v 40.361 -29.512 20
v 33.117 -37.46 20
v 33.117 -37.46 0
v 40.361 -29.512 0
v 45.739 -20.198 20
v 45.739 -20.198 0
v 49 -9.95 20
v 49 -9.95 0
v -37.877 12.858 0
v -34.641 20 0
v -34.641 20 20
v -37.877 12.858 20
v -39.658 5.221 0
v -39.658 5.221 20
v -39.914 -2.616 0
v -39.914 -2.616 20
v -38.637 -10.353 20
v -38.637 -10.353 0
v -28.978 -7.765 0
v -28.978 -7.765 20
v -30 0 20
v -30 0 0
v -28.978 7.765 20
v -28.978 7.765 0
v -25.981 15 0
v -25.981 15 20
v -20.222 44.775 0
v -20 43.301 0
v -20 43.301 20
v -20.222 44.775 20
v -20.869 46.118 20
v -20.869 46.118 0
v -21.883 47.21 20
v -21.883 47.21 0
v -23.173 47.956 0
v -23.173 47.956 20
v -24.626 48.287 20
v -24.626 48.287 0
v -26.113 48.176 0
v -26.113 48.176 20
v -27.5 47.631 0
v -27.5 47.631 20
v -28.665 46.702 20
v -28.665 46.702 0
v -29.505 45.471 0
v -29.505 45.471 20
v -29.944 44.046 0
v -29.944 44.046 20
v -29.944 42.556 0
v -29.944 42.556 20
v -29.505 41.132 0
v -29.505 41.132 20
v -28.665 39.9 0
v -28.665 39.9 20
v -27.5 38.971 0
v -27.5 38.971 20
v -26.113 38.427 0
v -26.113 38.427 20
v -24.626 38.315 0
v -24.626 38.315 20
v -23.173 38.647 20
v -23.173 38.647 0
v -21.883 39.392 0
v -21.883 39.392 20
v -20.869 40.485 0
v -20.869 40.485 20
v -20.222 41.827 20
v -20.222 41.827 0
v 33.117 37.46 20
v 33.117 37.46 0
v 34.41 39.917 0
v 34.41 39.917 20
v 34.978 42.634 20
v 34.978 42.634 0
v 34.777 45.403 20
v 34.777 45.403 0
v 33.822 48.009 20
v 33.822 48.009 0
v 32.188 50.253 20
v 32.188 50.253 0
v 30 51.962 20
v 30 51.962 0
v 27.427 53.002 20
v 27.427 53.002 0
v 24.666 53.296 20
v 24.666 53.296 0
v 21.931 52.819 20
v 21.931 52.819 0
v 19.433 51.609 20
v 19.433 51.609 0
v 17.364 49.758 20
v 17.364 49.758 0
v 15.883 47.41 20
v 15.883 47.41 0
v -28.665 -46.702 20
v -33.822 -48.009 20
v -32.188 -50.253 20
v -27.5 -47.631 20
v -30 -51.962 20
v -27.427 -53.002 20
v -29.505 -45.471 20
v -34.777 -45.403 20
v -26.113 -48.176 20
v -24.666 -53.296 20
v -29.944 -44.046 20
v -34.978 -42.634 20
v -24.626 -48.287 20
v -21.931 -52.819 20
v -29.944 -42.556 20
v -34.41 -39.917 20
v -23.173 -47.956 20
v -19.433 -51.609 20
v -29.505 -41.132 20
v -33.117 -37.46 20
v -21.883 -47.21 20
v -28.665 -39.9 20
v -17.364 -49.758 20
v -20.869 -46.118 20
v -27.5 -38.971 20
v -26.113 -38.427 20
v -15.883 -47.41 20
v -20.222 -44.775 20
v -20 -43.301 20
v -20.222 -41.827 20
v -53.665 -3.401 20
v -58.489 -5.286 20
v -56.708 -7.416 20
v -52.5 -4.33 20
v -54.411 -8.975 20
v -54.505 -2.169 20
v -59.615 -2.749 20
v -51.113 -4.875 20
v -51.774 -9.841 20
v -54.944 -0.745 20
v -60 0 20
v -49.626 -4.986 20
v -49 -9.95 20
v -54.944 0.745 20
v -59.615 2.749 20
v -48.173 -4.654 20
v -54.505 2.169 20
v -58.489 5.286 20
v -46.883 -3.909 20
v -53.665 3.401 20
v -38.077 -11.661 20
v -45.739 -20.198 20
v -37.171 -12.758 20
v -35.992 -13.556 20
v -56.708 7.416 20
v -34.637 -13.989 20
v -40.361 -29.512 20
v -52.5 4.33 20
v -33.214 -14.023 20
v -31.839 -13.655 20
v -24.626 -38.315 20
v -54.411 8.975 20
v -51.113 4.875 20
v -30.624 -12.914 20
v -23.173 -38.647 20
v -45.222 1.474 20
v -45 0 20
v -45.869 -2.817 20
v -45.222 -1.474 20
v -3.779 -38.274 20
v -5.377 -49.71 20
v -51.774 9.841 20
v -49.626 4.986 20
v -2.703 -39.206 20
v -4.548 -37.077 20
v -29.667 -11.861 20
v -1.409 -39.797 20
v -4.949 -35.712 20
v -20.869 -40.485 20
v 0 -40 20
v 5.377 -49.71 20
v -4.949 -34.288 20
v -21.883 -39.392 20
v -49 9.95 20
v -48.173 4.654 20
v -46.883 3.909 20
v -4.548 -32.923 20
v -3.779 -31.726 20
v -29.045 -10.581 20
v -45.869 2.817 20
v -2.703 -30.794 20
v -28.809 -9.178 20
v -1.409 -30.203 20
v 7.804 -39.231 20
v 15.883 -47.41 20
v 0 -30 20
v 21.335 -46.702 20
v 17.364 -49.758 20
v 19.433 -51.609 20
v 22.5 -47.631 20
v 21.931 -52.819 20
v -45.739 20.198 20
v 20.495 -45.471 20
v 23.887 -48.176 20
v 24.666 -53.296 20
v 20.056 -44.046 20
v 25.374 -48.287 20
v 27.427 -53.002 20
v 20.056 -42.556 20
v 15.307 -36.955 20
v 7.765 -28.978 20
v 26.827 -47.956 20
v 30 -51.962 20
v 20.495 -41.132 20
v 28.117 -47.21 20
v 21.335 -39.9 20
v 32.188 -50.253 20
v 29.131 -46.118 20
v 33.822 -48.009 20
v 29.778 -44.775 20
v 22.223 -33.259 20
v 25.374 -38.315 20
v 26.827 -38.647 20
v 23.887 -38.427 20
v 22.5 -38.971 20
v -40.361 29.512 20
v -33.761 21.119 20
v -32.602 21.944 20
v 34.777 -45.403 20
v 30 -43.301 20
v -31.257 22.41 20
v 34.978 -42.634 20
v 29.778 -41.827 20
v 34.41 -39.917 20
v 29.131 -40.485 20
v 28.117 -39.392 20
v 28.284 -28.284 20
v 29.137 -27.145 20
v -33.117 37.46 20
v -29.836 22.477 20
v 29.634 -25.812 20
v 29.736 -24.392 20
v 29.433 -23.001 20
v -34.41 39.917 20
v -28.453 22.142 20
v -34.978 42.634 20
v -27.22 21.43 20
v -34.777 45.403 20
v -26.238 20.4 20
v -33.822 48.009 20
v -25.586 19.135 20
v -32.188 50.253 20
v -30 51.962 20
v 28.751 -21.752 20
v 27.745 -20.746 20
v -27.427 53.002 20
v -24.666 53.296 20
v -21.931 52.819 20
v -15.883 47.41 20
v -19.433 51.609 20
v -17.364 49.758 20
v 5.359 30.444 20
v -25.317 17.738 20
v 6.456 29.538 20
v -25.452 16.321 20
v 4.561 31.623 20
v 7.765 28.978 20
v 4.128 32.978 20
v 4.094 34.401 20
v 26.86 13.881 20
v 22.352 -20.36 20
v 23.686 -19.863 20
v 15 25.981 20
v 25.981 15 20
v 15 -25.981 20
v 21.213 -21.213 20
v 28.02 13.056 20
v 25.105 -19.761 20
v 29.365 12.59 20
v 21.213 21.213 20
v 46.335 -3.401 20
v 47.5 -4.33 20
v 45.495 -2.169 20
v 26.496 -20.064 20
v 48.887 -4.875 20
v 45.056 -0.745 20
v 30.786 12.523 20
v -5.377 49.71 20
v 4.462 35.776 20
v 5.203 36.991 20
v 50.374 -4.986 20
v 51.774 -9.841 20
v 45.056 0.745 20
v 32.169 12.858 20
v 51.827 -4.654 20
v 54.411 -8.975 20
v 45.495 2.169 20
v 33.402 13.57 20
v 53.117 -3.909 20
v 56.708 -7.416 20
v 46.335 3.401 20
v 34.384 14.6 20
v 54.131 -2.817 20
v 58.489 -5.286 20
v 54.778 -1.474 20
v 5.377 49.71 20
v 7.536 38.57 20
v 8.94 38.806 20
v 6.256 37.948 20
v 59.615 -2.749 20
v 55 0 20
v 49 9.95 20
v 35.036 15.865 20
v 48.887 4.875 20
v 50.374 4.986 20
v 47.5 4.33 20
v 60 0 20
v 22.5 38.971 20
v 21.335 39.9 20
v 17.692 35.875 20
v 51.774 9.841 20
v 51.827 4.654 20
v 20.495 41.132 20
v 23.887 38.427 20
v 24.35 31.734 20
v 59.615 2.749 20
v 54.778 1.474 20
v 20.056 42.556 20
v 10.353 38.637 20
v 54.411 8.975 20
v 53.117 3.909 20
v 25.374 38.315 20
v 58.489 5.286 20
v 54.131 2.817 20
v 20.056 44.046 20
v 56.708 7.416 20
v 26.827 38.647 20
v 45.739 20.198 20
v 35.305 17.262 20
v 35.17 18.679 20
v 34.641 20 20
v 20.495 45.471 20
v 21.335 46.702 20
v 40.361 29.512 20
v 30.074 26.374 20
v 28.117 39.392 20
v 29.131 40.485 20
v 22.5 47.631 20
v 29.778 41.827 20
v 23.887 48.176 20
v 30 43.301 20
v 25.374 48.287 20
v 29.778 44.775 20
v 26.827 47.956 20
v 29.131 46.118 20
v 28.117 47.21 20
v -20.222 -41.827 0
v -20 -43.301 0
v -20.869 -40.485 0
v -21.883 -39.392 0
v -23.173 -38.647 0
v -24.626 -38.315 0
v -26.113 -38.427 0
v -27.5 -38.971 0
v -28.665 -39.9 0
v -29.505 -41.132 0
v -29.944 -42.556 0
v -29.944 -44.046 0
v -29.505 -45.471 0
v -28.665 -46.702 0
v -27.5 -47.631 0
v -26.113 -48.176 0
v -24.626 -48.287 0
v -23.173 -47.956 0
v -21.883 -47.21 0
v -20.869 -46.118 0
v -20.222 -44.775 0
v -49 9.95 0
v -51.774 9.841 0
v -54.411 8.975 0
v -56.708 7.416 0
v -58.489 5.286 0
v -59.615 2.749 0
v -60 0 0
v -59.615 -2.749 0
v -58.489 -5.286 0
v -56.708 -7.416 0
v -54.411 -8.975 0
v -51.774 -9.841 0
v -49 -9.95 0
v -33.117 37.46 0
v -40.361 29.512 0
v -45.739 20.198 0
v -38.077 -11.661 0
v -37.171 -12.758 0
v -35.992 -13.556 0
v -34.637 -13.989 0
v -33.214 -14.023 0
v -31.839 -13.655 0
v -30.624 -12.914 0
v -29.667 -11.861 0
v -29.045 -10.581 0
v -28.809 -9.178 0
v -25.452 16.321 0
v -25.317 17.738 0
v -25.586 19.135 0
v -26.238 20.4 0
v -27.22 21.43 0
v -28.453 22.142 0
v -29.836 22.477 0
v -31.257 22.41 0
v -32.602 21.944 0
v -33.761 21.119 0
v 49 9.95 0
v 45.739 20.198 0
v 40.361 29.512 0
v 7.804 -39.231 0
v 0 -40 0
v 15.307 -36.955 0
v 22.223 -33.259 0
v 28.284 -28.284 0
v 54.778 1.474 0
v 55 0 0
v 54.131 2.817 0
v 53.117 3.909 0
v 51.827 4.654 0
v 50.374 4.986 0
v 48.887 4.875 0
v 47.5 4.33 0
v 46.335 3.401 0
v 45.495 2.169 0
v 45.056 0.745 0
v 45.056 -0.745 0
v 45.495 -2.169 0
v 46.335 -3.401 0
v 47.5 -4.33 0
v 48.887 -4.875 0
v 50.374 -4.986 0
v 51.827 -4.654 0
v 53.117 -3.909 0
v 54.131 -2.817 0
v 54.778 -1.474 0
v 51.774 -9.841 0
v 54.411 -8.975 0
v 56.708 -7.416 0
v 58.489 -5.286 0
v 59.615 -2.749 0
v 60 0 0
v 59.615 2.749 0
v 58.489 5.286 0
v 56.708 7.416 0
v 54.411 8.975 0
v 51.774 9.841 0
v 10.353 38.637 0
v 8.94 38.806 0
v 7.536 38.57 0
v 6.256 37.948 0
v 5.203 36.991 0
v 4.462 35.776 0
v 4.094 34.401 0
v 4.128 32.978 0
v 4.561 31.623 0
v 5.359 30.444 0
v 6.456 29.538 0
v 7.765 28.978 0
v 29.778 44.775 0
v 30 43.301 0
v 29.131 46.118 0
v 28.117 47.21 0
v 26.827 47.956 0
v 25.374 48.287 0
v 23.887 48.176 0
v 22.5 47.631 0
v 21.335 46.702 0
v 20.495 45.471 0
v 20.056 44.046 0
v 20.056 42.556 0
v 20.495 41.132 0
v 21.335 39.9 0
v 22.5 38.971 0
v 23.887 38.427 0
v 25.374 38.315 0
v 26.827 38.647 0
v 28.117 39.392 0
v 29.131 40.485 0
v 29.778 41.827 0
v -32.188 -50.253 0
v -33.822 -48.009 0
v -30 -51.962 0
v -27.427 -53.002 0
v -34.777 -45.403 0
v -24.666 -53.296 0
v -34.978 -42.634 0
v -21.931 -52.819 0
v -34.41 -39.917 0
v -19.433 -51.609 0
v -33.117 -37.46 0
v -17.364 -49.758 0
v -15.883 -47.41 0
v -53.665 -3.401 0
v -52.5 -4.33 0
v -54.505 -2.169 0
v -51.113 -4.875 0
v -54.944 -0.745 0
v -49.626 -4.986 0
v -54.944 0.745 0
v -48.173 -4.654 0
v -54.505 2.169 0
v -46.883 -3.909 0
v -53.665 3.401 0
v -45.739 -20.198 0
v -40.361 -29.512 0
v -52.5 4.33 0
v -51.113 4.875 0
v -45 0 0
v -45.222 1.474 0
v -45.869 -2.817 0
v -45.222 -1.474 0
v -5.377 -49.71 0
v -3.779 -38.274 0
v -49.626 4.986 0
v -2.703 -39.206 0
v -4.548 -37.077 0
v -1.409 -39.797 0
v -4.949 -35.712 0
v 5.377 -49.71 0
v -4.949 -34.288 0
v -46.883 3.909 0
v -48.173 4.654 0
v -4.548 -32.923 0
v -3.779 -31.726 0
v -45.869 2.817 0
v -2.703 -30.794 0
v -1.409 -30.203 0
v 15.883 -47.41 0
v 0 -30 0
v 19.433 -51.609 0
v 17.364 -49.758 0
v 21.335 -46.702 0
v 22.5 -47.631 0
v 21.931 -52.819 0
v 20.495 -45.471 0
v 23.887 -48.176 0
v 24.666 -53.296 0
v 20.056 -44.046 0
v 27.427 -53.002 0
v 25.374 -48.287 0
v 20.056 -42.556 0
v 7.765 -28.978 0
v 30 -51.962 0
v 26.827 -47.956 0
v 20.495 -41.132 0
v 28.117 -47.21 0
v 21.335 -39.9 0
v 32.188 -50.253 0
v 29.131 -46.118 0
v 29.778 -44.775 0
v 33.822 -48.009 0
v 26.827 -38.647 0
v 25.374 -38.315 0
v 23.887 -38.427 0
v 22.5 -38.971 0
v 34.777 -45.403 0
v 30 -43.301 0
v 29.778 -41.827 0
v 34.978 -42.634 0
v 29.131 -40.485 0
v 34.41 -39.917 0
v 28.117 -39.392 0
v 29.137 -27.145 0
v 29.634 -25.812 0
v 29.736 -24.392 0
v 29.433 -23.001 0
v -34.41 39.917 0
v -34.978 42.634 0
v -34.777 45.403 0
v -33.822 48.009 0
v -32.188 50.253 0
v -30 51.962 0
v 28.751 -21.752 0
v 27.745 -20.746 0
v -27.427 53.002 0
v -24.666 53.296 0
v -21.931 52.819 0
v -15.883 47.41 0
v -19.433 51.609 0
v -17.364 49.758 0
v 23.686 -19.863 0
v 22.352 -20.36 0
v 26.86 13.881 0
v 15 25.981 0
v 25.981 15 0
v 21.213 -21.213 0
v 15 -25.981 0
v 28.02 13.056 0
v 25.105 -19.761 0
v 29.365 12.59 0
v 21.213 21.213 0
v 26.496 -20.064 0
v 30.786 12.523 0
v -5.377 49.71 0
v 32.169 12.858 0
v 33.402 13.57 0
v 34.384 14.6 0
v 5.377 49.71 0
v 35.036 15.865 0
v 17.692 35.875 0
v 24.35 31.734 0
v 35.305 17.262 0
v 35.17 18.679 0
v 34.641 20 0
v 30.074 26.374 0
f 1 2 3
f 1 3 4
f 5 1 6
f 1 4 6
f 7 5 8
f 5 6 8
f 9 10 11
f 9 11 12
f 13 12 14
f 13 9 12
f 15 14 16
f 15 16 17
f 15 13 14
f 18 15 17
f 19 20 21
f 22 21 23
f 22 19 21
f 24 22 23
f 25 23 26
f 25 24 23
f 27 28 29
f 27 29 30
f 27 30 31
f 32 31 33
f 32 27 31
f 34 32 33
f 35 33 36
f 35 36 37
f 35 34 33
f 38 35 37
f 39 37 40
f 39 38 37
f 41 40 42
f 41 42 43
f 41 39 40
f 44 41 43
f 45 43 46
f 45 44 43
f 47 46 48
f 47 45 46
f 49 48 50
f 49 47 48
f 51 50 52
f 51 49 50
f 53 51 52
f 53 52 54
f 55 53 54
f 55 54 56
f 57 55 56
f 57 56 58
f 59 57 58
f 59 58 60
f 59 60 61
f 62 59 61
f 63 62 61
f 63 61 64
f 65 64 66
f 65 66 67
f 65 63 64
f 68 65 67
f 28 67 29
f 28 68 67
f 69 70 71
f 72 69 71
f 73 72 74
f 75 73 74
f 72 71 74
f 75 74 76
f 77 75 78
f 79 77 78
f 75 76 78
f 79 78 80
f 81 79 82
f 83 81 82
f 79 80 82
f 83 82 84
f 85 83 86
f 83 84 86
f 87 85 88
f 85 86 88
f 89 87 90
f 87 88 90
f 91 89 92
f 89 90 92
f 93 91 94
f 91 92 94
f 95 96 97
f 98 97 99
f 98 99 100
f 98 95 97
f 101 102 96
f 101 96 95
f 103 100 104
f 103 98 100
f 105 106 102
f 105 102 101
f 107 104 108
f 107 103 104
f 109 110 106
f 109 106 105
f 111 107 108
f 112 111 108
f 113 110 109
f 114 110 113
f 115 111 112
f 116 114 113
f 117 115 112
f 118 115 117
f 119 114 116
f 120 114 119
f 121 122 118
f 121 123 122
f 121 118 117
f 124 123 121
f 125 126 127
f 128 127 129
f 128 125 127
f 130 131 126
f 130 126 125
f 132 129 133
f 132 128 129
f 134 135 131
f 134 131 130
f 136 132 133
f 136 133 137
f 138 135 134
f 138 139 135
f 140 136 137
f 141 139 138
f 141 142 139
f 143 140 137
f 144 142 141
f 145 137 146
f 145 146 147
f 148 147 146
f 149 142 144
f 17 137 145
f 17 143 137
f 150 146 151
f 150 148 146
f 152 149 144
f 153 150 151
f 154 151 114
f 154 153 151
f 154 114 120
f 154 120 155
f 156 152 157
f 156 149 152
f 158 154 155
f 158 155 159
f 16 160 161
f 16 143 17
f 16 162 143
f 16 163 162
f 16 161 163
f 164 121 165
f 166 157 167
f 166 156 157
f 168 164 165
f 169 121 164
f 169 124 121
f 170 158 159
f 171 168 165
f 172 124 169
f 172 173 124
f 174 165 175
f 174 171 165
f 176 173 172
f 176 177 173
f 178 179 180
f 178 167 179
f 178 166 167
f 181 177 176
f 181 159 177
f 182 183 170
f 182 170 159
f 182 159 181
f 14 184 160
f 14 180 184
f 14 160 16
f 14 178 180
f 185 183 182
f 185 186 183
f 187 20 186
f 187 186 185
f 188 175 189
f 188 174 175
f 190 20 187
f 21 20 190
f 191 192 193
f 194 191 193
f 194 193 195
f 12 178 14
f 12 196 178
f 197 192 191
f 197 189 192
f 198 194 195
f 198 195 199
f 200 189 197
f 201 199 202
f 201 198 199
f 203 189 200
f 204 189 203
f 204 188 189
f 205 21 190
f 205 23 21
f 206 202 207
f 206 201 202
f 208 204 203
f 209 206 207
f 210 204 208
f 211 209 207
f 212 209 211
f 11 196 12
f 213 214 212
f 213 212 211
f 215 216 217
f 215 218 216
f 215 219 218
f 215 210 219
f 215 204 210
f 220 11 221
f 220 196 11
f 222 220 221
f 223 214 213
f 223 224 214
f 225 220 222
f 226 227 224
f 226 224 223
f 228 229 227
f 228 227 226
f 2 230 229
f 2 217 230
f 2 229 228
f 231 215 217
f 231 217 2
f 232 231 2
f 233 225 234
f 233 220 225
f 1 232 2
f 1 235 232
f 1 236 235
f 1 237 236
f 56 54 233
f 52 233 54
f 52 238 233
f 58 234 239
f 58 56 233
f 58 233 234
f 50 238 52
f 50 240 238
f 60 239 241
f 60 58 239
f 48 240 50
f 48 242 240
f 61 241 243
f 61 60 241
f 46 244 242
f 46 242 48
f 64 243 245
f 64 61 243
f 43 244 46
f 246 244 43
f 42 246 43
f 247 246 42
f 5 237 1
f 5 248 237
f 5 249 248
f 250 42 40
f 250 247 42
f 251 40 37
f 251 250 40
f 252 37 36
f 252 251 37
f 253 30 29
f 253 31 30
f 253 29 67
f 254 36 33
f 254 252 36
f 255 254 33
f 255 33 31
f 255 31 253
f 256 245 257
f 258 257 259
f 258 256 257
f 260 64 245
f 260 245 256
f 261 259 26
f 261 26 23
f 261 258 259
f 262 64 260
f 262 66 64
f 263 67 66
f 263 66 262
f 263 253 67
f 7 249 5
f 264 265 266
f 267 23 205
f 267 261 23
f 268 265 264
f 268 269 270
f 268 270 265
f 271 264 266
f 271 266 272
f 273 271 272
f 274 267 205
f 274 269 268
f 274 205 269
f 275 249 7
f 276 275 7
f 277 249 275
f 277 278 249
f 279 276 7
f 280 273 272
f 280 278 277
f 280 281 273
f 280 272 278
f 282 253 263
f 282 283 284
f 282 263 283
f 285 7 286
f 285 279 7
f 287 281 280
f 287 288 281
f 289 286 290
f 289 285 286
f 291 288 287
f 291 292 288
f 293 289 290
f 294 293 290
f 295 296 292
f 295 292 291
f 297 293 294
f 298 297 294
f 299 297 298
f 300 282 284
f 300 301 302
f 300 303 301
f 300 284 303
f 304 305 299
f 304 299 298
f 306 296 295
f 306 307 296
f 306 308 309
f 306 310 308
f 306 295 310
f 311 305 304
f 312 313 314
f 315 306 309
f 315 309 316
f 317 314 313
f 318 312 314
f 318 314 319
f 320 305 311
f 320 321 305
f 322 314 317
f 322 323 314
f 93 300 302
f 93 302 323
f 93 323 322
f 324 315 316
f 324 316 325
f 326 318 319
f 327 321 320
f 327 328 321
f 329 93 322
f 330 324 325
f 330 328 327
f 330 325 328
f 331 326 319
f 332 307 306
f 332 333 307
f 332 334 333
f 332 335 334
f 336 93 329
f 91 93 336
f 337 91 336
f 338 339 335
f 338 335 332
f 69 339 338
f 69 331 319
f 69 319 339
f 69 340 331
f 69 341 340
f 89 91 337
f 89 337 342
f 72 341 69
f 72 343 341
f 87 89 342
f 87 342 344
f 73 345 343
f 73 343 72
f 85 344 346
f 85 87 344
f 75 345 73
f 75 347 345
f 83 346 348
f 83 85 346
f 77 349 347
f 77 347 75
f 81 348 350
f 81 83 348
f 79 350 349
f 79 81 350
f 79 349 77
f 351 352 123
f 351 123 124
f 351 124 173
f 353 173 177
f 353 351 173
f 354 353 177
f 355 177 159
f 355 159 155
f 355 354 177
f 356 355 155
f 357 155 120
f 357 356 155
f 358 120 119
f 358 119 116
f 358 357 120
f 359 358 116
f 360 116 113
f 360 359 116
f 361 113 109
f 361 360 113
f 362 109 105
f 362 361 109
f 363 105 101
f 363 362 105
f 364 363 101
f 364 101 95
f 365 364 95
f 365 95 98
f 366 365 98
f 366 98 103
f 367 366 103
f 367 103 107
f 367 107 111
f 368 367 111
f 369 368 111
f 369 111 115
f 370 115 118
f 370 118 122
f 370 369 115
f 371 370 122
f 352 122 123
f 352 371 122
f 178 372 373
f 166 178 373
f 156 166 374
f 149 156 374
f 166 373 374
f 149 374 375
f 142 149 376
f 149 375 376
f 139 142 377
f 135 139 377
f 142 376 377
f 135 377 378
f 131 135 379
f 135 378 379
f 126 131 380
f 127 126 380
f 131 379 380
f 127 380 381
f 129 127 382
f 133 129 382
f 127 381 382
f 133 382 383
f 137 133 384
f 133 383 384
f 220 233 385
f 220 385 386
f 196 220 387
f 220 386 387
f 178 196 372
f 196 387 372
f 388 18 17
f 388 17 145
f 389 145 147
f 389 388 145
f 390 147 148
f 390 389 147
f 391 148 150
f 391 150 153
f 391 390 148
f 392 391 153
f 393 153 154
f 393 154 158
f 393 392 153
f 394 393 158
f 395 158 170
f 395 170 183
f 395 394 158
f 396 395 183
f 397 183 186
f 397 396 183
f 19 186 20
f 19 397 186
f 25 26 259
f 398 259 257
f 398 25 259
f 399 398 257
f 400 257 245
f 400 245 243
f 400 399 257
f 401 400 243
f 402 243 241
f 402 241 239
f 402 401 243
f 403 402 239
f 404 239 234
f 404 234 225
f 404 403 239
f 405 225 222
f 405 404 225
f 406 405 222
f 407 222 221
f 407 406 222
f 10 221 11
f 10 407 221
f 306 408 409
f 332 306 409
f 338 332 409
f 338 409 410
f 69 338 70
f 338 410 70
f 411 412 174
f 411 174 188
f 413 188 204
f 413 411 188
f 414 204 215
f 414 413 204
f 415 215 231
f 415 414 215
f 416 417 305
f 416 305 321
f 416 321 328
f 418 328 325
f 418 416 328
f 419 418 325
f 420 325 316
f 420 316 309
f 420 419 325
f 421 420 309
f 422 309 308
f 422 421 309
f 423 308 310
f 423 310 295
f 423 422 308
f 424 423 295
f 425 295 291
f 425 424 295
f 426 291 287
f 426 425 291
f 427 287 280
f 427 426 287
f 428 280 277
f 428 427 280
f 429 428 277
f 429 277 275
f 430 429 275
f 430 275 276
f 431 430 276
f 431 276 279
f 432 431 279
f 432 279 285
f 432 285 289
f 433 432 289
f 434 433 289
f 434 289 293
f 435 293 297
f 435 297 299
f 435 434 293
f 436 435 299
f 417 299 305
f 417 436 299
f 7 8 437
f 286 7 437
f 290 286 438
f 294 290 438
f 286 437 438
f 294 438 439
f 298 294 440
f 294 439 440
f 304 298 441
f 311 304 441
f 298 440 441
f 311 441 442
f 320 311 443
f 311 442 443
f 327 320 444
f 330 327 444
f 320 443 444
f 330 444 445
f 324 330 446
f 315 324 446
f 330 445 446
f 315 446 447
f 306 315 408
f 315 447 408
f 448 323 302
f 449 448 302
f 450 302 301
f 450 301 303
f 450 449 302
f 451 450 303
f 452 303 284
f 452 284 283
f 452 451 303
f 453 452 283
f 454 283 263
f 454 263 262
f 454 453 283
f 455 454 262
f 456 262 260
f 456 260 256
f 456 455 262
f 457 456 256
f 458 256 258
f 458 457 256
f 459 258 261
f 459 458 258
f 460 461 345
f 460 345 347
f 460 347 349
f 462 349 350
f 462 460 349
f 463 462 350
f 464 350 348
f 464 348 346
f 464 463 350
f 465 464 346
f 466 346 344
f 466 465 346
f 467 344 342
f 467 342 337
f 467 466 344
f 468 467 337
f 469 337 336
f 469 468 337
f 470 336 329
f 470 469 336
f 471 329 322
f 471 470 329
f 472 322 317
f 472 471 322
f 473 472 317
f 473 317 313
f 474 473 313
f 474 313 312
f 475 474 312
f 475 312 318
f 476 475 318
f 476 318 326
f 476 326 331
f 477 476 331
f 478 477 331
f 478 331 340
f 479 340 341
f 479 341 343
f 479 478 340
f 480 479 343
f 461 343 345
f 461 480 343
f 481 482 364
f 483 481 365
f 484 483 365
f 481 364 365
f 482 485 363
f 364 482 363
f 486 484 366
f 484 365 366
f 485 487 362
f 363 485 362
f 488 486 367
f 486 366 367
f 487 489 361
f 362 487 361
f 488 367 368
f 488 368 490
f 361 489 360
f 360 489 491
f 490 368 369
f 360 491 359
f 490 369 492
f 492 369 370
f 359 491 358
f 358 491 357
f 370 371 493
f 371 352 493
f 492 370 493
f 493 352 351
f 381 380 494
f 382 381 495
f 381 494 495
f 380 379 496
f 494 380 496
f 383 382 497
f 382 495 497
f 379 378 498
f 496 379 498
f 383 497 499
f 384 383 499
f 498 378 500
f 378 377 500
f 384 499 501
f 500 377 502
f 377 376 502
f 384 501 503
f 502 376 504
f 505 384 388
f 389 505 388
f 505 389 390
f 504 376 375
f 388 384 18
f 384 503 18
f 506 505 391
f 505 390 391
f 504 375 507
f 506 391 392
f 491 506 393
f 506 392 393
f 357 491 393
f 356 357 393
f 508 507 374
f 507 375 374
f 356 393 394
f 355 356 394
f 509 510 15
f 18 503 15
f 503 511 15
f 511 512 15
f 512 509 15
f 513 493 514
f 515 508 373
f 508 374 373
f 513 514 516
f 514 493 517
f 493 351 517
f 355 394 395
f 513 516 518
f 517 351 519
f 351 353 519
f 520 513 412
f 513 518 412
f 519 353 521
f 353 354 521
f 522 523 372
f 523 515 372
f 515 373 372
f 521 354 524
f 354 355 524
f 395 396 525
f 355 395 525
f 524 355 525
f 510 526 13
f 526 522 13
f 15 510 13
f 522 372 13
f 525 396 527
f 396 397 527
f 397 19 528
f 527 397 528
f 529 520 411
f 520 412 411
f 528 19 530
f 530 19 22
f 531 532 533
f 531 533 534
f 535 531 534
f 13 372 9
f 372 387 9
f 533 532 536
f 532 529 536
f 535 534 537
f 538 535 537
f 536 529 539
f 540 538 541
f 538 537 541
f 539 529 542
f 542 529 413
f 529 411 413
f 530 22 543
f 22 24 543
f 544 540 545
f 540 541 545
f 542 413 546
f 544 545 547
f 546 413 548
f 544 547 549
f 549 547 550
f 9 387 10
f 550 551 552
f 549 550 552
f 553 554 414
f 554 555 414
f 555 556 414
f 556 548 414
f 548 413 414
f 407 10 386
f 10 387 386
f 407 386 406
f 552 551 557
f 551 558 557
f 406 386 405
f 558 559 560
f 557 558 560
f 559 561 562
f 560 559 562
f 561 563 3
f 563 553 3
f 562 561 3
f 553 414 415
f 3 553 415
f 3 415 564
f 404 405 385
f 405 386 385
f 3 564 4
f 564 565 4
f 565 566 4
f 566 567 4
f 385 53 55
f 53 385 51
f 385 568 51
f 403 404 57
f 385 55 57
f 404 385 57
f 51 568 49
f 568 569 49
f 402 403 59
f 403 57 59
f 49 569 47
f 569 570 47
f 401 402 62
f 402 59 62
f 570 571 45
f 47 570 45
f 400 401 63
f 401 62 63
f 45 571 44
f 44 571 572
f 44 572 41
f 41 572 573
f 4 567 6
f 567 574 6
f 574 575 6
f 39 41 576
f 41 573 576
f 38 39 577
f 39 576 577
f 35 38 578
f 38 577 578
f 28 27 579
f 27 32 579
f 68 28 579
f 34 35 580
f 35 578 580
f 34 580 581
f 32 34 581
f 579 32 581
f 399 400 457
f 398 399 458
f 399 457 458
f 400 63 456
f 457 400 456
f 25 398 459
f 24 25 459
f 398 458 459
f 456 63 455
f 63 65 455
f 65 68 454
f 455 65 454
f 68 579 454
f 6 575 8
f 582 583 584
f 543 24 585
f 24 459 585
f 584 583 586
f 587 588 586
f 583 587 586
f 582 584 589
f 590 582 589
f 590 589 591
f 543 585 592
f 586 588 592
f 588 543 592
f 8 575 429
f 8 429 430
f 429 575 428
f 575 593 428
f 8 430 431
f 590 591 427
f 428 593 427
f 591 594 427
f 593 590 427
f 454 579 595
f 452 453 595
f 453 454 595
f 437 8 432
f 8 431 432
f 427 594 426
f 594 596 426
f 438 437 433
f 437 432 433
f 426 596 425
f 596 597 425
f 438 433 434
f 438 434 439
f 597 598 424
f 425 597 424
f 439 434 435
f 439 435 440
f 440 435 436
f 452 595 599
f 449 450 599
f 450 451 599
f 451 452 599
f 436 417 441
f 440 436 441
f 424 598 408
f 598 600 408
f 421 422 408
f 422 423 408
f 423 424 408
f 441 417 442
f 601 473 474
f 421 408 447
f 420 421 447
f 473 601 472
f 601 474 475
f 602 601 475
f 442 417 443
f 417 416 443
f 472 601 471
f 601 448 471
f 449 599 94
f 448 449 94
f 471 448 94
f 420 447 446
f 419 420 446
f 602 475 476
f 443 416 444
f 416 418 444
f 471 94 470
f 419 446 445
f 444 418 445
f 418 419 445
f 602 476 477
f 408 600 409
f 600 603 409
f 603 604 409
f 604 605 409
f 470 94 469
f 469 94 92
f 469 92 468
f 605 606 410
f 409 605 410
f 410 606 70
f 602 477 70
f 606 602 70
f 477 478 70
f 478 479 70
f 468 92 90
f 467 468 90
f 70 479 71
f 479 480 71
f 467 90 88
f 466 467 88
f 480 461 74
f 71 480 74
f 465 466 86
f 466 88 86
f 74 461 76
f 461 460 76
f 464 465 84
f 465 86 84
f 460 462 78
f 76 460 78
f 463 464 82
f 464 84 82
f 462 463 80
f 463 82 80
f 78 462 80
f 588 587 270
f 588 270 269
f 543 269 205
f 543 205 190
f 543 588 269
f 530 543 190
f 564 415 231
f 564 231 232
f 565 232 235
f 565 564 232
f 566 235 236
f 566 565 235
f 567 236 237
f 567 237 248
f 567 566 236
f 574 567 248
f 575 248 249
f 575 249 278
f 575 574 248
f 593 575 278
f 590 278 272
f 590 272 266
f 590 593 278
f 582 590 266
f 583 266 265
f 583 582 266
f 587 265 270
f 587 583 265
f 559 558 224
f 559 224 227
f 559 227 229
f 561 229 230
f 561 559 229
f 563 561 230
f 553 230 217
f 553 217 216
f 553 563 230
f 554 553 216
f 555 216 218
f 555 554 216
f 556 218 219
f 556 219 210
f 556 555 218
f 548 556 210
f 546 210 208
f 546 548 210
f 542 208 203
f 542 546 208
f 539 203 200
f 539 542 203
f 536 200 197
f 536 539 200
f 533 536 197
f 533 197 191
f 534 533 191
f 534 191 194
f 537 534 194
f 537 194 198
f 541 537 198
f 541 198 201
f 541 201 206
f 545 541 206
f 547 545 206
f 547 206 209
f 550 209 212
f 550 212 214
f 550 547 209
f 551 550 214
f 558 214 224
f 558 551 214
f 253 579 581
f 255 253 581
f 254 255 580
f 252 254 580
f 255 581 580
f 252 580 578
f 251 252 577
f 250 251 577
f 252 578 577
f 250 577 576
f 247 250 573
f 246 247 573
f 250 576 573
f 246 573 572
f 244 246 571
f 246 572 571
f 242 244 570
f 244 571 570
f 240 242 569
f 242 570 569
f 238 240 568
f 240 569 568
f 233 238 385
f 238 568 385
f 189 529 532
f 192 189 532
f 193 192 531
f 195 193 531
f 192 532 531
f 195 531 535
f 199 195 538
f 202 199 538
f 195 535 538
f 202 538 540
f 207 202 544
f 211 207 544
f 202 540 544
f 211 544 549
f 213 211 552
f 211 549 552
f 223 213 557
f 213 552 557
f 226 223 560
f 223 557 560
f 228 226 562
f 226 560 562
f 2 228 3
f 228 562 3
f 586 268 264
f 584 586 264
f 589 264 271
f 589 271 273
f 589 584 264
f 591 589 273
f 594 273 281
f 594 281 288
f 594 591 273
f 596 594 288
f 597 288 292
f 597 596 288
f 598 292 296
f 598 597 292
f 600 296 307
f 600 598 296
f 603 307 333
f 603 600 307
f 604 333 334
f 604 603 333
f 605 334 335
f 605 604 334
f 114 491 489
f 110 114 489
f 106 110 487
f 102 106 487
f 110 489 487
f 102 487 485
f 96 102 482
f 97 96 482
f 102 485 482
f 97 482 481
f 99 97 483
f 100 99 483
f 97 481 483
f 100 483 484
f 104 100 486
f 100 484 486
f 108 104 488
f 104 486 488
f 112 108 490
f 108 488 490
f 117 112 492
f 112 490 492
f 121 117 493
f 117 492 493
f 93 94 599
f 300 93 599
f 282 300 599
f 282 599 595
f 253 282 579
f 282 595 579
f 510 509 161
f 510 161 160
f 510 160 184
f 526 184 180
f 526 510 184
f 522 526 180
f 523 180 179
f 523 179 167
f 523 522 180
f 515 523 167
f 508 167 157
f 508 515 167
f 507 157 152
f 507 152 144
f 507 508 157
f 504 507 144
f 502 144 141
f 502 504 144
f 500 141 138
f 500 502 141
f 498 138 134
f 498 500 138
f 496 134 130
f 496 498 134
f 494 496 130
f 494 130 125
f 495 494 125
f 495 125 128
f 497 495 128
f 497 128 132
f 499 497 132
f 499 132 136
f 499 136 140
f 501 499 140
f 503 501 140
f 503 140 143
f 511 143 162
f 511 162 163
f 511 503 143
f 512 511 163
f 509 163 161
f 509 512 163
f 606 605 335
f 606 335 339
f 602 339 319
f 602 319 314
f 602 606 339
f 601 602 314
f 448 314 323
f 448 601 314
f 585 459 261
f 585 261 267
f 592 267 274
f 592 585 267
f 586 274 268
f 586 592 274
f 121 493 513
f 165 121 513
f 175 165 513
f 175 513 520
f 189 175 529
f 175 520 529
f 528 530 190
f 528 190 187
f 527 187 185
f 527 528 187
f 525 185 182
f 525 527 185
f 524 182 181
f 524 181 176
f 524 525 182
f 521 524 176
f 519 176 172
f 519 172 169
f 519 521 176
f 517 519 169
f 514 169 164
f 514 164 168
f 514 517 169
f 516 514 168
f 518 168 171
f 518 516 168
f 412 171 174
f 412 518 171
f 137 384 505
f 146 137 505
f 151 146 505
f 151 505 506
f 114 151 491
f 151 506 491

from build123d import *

# Parameters (mm, degrees)
SKETCH2_R           = 5
BOSS_EXTRUDE2_DEPTH = 20


with BuildPart() as part:
    # Sketch2 → Boss-Extrude2 (new body)
    with BuildSketch(Plane.XY):
        with BuildLine():
            ThreePointArc((-49, -9.949874371), (-43.301270189, -25), (-33.11684397, -37.4603076))
            ThreePointArc((-33.11684397, -37.4603076), (-30, -51.961524227), (-15.88315603, -47.410181971))
            ThreePointArc((-15.88315603, -47.410181971), (0, -50), (15.88315603, -47.410181971))
            ThreePointArc((15.88315603, -47.410181971), (30, -51.961524227), (33.11684397, -37.4603076))
            ThreePointArc((33.11684397, -37.4603076), (43.301270189, -25), (49, -9.949874371))
            ThreePointArc((49, -9.949874371), (60, 0), (49, 9.949874371))
            ThreePointArc((49, 9.949874371), (43.301270189, 25), (33.11684397, 37.4603076))
            ThreePointArc((33.11684397, 37.4603076), (30, 51.961524227), (15.88315603, 47.410181971))
            ThreePointArc((15.88315603, 47.410181971), (0, 50), (-15.88315603, 47.410181971))
            ThreePointArc((-15.88315603, 47.410181971), (-30, 51.961524227), (-33.11684397, 37.4603076))
            ThreePointArc((-33.11684397, 37.4603076), (-43.301270189, 25), (-49, 9.949874371))
            ThreePointArc((-49, 9.949874371), (-60, 0), (-49, -9.949874371))
        make_face()
        with Locations((-50, 0)):
            Circle(SKETCH2_R, mode=Mode.SUBTRACT)
        with Locations((-25, 43.301270189)):
            Circle(SKETCH2_R, mode=Mode.SUBTRACT)
        with Locations((25, 43.301270189)):
            Circle(SKETCH2_R, mode=Mode.SUBTRACT)
        with Locations((50, 0)):
            Circle(SKETCH2_R, mode=Mode.SUBTRACT)
        with Locations((25, -43.301270189)):
            Circle(SKETCH2_R, mode=Mode.SUBTRACT)
        with Locations((-25, -43.301270189)):
            Circle(SKETCH2_R, mode=Mode.SUBTRACT)
        with BuildLine():
            ThreePointArc((34.641016151, 20), (24.35045716, 31.734133612), (10.352761804, 38.637033052))
            ThreePointArc((10.352761804, 38.637033052), (4.229037447, 35.101499146), (7.764571353, 28.977774789))
            ThreePointArc((7.764571353, 28.977774789), (18.26284287, 23.800600209), (25.980762114, 15))
            ThreePointArc((25.980762114, 15), (32.810889132, 13.169872981), (34.641016151, 20))
        make_face(mode=Mode.SUBTRACT)
        with BuildLine():
            ThreePointArc((0, -40), (15.307337295, -36.9551813), (28.284271247, -28.284271247))
            ThreePointArc((28.284271247, -28.284271247), (28.284271247, -21.213203436), (21.213203436, -21.213203436))
            ThreePointArc((21.213203436, -21.213203436), (11.480502971, -27.716385975), (0, -30))
            ThreePointArc((0, -30), (-5, -35), (0, -40))
        make_face(mode=Mode.SUBTRACT)
        with BuildLine():
            ThreePointArc((-34.641016151, 20), (-39.657794455, 5.221047689), (-38.637033052, -10.352761804))
            ThreePointArc((-38.637033052, -10.352761804), (-32.513308695, -13.88829571), (-28.977774789, -7.764571353))
            ThreePointArc((-28.977774789, -7.764571353), (-29.743345841, 3.915785767), (-25.980762114, 15))
            ThreePointArc((-25.980762114, 15), (-27.810889132, 21.830127019), (-34.641016151, 20))
        make_face(mode=Mode.SUBTRACT)
    extrude(amount=BOSS_EXTRUDE2_DEPTH)


solid = part.part
